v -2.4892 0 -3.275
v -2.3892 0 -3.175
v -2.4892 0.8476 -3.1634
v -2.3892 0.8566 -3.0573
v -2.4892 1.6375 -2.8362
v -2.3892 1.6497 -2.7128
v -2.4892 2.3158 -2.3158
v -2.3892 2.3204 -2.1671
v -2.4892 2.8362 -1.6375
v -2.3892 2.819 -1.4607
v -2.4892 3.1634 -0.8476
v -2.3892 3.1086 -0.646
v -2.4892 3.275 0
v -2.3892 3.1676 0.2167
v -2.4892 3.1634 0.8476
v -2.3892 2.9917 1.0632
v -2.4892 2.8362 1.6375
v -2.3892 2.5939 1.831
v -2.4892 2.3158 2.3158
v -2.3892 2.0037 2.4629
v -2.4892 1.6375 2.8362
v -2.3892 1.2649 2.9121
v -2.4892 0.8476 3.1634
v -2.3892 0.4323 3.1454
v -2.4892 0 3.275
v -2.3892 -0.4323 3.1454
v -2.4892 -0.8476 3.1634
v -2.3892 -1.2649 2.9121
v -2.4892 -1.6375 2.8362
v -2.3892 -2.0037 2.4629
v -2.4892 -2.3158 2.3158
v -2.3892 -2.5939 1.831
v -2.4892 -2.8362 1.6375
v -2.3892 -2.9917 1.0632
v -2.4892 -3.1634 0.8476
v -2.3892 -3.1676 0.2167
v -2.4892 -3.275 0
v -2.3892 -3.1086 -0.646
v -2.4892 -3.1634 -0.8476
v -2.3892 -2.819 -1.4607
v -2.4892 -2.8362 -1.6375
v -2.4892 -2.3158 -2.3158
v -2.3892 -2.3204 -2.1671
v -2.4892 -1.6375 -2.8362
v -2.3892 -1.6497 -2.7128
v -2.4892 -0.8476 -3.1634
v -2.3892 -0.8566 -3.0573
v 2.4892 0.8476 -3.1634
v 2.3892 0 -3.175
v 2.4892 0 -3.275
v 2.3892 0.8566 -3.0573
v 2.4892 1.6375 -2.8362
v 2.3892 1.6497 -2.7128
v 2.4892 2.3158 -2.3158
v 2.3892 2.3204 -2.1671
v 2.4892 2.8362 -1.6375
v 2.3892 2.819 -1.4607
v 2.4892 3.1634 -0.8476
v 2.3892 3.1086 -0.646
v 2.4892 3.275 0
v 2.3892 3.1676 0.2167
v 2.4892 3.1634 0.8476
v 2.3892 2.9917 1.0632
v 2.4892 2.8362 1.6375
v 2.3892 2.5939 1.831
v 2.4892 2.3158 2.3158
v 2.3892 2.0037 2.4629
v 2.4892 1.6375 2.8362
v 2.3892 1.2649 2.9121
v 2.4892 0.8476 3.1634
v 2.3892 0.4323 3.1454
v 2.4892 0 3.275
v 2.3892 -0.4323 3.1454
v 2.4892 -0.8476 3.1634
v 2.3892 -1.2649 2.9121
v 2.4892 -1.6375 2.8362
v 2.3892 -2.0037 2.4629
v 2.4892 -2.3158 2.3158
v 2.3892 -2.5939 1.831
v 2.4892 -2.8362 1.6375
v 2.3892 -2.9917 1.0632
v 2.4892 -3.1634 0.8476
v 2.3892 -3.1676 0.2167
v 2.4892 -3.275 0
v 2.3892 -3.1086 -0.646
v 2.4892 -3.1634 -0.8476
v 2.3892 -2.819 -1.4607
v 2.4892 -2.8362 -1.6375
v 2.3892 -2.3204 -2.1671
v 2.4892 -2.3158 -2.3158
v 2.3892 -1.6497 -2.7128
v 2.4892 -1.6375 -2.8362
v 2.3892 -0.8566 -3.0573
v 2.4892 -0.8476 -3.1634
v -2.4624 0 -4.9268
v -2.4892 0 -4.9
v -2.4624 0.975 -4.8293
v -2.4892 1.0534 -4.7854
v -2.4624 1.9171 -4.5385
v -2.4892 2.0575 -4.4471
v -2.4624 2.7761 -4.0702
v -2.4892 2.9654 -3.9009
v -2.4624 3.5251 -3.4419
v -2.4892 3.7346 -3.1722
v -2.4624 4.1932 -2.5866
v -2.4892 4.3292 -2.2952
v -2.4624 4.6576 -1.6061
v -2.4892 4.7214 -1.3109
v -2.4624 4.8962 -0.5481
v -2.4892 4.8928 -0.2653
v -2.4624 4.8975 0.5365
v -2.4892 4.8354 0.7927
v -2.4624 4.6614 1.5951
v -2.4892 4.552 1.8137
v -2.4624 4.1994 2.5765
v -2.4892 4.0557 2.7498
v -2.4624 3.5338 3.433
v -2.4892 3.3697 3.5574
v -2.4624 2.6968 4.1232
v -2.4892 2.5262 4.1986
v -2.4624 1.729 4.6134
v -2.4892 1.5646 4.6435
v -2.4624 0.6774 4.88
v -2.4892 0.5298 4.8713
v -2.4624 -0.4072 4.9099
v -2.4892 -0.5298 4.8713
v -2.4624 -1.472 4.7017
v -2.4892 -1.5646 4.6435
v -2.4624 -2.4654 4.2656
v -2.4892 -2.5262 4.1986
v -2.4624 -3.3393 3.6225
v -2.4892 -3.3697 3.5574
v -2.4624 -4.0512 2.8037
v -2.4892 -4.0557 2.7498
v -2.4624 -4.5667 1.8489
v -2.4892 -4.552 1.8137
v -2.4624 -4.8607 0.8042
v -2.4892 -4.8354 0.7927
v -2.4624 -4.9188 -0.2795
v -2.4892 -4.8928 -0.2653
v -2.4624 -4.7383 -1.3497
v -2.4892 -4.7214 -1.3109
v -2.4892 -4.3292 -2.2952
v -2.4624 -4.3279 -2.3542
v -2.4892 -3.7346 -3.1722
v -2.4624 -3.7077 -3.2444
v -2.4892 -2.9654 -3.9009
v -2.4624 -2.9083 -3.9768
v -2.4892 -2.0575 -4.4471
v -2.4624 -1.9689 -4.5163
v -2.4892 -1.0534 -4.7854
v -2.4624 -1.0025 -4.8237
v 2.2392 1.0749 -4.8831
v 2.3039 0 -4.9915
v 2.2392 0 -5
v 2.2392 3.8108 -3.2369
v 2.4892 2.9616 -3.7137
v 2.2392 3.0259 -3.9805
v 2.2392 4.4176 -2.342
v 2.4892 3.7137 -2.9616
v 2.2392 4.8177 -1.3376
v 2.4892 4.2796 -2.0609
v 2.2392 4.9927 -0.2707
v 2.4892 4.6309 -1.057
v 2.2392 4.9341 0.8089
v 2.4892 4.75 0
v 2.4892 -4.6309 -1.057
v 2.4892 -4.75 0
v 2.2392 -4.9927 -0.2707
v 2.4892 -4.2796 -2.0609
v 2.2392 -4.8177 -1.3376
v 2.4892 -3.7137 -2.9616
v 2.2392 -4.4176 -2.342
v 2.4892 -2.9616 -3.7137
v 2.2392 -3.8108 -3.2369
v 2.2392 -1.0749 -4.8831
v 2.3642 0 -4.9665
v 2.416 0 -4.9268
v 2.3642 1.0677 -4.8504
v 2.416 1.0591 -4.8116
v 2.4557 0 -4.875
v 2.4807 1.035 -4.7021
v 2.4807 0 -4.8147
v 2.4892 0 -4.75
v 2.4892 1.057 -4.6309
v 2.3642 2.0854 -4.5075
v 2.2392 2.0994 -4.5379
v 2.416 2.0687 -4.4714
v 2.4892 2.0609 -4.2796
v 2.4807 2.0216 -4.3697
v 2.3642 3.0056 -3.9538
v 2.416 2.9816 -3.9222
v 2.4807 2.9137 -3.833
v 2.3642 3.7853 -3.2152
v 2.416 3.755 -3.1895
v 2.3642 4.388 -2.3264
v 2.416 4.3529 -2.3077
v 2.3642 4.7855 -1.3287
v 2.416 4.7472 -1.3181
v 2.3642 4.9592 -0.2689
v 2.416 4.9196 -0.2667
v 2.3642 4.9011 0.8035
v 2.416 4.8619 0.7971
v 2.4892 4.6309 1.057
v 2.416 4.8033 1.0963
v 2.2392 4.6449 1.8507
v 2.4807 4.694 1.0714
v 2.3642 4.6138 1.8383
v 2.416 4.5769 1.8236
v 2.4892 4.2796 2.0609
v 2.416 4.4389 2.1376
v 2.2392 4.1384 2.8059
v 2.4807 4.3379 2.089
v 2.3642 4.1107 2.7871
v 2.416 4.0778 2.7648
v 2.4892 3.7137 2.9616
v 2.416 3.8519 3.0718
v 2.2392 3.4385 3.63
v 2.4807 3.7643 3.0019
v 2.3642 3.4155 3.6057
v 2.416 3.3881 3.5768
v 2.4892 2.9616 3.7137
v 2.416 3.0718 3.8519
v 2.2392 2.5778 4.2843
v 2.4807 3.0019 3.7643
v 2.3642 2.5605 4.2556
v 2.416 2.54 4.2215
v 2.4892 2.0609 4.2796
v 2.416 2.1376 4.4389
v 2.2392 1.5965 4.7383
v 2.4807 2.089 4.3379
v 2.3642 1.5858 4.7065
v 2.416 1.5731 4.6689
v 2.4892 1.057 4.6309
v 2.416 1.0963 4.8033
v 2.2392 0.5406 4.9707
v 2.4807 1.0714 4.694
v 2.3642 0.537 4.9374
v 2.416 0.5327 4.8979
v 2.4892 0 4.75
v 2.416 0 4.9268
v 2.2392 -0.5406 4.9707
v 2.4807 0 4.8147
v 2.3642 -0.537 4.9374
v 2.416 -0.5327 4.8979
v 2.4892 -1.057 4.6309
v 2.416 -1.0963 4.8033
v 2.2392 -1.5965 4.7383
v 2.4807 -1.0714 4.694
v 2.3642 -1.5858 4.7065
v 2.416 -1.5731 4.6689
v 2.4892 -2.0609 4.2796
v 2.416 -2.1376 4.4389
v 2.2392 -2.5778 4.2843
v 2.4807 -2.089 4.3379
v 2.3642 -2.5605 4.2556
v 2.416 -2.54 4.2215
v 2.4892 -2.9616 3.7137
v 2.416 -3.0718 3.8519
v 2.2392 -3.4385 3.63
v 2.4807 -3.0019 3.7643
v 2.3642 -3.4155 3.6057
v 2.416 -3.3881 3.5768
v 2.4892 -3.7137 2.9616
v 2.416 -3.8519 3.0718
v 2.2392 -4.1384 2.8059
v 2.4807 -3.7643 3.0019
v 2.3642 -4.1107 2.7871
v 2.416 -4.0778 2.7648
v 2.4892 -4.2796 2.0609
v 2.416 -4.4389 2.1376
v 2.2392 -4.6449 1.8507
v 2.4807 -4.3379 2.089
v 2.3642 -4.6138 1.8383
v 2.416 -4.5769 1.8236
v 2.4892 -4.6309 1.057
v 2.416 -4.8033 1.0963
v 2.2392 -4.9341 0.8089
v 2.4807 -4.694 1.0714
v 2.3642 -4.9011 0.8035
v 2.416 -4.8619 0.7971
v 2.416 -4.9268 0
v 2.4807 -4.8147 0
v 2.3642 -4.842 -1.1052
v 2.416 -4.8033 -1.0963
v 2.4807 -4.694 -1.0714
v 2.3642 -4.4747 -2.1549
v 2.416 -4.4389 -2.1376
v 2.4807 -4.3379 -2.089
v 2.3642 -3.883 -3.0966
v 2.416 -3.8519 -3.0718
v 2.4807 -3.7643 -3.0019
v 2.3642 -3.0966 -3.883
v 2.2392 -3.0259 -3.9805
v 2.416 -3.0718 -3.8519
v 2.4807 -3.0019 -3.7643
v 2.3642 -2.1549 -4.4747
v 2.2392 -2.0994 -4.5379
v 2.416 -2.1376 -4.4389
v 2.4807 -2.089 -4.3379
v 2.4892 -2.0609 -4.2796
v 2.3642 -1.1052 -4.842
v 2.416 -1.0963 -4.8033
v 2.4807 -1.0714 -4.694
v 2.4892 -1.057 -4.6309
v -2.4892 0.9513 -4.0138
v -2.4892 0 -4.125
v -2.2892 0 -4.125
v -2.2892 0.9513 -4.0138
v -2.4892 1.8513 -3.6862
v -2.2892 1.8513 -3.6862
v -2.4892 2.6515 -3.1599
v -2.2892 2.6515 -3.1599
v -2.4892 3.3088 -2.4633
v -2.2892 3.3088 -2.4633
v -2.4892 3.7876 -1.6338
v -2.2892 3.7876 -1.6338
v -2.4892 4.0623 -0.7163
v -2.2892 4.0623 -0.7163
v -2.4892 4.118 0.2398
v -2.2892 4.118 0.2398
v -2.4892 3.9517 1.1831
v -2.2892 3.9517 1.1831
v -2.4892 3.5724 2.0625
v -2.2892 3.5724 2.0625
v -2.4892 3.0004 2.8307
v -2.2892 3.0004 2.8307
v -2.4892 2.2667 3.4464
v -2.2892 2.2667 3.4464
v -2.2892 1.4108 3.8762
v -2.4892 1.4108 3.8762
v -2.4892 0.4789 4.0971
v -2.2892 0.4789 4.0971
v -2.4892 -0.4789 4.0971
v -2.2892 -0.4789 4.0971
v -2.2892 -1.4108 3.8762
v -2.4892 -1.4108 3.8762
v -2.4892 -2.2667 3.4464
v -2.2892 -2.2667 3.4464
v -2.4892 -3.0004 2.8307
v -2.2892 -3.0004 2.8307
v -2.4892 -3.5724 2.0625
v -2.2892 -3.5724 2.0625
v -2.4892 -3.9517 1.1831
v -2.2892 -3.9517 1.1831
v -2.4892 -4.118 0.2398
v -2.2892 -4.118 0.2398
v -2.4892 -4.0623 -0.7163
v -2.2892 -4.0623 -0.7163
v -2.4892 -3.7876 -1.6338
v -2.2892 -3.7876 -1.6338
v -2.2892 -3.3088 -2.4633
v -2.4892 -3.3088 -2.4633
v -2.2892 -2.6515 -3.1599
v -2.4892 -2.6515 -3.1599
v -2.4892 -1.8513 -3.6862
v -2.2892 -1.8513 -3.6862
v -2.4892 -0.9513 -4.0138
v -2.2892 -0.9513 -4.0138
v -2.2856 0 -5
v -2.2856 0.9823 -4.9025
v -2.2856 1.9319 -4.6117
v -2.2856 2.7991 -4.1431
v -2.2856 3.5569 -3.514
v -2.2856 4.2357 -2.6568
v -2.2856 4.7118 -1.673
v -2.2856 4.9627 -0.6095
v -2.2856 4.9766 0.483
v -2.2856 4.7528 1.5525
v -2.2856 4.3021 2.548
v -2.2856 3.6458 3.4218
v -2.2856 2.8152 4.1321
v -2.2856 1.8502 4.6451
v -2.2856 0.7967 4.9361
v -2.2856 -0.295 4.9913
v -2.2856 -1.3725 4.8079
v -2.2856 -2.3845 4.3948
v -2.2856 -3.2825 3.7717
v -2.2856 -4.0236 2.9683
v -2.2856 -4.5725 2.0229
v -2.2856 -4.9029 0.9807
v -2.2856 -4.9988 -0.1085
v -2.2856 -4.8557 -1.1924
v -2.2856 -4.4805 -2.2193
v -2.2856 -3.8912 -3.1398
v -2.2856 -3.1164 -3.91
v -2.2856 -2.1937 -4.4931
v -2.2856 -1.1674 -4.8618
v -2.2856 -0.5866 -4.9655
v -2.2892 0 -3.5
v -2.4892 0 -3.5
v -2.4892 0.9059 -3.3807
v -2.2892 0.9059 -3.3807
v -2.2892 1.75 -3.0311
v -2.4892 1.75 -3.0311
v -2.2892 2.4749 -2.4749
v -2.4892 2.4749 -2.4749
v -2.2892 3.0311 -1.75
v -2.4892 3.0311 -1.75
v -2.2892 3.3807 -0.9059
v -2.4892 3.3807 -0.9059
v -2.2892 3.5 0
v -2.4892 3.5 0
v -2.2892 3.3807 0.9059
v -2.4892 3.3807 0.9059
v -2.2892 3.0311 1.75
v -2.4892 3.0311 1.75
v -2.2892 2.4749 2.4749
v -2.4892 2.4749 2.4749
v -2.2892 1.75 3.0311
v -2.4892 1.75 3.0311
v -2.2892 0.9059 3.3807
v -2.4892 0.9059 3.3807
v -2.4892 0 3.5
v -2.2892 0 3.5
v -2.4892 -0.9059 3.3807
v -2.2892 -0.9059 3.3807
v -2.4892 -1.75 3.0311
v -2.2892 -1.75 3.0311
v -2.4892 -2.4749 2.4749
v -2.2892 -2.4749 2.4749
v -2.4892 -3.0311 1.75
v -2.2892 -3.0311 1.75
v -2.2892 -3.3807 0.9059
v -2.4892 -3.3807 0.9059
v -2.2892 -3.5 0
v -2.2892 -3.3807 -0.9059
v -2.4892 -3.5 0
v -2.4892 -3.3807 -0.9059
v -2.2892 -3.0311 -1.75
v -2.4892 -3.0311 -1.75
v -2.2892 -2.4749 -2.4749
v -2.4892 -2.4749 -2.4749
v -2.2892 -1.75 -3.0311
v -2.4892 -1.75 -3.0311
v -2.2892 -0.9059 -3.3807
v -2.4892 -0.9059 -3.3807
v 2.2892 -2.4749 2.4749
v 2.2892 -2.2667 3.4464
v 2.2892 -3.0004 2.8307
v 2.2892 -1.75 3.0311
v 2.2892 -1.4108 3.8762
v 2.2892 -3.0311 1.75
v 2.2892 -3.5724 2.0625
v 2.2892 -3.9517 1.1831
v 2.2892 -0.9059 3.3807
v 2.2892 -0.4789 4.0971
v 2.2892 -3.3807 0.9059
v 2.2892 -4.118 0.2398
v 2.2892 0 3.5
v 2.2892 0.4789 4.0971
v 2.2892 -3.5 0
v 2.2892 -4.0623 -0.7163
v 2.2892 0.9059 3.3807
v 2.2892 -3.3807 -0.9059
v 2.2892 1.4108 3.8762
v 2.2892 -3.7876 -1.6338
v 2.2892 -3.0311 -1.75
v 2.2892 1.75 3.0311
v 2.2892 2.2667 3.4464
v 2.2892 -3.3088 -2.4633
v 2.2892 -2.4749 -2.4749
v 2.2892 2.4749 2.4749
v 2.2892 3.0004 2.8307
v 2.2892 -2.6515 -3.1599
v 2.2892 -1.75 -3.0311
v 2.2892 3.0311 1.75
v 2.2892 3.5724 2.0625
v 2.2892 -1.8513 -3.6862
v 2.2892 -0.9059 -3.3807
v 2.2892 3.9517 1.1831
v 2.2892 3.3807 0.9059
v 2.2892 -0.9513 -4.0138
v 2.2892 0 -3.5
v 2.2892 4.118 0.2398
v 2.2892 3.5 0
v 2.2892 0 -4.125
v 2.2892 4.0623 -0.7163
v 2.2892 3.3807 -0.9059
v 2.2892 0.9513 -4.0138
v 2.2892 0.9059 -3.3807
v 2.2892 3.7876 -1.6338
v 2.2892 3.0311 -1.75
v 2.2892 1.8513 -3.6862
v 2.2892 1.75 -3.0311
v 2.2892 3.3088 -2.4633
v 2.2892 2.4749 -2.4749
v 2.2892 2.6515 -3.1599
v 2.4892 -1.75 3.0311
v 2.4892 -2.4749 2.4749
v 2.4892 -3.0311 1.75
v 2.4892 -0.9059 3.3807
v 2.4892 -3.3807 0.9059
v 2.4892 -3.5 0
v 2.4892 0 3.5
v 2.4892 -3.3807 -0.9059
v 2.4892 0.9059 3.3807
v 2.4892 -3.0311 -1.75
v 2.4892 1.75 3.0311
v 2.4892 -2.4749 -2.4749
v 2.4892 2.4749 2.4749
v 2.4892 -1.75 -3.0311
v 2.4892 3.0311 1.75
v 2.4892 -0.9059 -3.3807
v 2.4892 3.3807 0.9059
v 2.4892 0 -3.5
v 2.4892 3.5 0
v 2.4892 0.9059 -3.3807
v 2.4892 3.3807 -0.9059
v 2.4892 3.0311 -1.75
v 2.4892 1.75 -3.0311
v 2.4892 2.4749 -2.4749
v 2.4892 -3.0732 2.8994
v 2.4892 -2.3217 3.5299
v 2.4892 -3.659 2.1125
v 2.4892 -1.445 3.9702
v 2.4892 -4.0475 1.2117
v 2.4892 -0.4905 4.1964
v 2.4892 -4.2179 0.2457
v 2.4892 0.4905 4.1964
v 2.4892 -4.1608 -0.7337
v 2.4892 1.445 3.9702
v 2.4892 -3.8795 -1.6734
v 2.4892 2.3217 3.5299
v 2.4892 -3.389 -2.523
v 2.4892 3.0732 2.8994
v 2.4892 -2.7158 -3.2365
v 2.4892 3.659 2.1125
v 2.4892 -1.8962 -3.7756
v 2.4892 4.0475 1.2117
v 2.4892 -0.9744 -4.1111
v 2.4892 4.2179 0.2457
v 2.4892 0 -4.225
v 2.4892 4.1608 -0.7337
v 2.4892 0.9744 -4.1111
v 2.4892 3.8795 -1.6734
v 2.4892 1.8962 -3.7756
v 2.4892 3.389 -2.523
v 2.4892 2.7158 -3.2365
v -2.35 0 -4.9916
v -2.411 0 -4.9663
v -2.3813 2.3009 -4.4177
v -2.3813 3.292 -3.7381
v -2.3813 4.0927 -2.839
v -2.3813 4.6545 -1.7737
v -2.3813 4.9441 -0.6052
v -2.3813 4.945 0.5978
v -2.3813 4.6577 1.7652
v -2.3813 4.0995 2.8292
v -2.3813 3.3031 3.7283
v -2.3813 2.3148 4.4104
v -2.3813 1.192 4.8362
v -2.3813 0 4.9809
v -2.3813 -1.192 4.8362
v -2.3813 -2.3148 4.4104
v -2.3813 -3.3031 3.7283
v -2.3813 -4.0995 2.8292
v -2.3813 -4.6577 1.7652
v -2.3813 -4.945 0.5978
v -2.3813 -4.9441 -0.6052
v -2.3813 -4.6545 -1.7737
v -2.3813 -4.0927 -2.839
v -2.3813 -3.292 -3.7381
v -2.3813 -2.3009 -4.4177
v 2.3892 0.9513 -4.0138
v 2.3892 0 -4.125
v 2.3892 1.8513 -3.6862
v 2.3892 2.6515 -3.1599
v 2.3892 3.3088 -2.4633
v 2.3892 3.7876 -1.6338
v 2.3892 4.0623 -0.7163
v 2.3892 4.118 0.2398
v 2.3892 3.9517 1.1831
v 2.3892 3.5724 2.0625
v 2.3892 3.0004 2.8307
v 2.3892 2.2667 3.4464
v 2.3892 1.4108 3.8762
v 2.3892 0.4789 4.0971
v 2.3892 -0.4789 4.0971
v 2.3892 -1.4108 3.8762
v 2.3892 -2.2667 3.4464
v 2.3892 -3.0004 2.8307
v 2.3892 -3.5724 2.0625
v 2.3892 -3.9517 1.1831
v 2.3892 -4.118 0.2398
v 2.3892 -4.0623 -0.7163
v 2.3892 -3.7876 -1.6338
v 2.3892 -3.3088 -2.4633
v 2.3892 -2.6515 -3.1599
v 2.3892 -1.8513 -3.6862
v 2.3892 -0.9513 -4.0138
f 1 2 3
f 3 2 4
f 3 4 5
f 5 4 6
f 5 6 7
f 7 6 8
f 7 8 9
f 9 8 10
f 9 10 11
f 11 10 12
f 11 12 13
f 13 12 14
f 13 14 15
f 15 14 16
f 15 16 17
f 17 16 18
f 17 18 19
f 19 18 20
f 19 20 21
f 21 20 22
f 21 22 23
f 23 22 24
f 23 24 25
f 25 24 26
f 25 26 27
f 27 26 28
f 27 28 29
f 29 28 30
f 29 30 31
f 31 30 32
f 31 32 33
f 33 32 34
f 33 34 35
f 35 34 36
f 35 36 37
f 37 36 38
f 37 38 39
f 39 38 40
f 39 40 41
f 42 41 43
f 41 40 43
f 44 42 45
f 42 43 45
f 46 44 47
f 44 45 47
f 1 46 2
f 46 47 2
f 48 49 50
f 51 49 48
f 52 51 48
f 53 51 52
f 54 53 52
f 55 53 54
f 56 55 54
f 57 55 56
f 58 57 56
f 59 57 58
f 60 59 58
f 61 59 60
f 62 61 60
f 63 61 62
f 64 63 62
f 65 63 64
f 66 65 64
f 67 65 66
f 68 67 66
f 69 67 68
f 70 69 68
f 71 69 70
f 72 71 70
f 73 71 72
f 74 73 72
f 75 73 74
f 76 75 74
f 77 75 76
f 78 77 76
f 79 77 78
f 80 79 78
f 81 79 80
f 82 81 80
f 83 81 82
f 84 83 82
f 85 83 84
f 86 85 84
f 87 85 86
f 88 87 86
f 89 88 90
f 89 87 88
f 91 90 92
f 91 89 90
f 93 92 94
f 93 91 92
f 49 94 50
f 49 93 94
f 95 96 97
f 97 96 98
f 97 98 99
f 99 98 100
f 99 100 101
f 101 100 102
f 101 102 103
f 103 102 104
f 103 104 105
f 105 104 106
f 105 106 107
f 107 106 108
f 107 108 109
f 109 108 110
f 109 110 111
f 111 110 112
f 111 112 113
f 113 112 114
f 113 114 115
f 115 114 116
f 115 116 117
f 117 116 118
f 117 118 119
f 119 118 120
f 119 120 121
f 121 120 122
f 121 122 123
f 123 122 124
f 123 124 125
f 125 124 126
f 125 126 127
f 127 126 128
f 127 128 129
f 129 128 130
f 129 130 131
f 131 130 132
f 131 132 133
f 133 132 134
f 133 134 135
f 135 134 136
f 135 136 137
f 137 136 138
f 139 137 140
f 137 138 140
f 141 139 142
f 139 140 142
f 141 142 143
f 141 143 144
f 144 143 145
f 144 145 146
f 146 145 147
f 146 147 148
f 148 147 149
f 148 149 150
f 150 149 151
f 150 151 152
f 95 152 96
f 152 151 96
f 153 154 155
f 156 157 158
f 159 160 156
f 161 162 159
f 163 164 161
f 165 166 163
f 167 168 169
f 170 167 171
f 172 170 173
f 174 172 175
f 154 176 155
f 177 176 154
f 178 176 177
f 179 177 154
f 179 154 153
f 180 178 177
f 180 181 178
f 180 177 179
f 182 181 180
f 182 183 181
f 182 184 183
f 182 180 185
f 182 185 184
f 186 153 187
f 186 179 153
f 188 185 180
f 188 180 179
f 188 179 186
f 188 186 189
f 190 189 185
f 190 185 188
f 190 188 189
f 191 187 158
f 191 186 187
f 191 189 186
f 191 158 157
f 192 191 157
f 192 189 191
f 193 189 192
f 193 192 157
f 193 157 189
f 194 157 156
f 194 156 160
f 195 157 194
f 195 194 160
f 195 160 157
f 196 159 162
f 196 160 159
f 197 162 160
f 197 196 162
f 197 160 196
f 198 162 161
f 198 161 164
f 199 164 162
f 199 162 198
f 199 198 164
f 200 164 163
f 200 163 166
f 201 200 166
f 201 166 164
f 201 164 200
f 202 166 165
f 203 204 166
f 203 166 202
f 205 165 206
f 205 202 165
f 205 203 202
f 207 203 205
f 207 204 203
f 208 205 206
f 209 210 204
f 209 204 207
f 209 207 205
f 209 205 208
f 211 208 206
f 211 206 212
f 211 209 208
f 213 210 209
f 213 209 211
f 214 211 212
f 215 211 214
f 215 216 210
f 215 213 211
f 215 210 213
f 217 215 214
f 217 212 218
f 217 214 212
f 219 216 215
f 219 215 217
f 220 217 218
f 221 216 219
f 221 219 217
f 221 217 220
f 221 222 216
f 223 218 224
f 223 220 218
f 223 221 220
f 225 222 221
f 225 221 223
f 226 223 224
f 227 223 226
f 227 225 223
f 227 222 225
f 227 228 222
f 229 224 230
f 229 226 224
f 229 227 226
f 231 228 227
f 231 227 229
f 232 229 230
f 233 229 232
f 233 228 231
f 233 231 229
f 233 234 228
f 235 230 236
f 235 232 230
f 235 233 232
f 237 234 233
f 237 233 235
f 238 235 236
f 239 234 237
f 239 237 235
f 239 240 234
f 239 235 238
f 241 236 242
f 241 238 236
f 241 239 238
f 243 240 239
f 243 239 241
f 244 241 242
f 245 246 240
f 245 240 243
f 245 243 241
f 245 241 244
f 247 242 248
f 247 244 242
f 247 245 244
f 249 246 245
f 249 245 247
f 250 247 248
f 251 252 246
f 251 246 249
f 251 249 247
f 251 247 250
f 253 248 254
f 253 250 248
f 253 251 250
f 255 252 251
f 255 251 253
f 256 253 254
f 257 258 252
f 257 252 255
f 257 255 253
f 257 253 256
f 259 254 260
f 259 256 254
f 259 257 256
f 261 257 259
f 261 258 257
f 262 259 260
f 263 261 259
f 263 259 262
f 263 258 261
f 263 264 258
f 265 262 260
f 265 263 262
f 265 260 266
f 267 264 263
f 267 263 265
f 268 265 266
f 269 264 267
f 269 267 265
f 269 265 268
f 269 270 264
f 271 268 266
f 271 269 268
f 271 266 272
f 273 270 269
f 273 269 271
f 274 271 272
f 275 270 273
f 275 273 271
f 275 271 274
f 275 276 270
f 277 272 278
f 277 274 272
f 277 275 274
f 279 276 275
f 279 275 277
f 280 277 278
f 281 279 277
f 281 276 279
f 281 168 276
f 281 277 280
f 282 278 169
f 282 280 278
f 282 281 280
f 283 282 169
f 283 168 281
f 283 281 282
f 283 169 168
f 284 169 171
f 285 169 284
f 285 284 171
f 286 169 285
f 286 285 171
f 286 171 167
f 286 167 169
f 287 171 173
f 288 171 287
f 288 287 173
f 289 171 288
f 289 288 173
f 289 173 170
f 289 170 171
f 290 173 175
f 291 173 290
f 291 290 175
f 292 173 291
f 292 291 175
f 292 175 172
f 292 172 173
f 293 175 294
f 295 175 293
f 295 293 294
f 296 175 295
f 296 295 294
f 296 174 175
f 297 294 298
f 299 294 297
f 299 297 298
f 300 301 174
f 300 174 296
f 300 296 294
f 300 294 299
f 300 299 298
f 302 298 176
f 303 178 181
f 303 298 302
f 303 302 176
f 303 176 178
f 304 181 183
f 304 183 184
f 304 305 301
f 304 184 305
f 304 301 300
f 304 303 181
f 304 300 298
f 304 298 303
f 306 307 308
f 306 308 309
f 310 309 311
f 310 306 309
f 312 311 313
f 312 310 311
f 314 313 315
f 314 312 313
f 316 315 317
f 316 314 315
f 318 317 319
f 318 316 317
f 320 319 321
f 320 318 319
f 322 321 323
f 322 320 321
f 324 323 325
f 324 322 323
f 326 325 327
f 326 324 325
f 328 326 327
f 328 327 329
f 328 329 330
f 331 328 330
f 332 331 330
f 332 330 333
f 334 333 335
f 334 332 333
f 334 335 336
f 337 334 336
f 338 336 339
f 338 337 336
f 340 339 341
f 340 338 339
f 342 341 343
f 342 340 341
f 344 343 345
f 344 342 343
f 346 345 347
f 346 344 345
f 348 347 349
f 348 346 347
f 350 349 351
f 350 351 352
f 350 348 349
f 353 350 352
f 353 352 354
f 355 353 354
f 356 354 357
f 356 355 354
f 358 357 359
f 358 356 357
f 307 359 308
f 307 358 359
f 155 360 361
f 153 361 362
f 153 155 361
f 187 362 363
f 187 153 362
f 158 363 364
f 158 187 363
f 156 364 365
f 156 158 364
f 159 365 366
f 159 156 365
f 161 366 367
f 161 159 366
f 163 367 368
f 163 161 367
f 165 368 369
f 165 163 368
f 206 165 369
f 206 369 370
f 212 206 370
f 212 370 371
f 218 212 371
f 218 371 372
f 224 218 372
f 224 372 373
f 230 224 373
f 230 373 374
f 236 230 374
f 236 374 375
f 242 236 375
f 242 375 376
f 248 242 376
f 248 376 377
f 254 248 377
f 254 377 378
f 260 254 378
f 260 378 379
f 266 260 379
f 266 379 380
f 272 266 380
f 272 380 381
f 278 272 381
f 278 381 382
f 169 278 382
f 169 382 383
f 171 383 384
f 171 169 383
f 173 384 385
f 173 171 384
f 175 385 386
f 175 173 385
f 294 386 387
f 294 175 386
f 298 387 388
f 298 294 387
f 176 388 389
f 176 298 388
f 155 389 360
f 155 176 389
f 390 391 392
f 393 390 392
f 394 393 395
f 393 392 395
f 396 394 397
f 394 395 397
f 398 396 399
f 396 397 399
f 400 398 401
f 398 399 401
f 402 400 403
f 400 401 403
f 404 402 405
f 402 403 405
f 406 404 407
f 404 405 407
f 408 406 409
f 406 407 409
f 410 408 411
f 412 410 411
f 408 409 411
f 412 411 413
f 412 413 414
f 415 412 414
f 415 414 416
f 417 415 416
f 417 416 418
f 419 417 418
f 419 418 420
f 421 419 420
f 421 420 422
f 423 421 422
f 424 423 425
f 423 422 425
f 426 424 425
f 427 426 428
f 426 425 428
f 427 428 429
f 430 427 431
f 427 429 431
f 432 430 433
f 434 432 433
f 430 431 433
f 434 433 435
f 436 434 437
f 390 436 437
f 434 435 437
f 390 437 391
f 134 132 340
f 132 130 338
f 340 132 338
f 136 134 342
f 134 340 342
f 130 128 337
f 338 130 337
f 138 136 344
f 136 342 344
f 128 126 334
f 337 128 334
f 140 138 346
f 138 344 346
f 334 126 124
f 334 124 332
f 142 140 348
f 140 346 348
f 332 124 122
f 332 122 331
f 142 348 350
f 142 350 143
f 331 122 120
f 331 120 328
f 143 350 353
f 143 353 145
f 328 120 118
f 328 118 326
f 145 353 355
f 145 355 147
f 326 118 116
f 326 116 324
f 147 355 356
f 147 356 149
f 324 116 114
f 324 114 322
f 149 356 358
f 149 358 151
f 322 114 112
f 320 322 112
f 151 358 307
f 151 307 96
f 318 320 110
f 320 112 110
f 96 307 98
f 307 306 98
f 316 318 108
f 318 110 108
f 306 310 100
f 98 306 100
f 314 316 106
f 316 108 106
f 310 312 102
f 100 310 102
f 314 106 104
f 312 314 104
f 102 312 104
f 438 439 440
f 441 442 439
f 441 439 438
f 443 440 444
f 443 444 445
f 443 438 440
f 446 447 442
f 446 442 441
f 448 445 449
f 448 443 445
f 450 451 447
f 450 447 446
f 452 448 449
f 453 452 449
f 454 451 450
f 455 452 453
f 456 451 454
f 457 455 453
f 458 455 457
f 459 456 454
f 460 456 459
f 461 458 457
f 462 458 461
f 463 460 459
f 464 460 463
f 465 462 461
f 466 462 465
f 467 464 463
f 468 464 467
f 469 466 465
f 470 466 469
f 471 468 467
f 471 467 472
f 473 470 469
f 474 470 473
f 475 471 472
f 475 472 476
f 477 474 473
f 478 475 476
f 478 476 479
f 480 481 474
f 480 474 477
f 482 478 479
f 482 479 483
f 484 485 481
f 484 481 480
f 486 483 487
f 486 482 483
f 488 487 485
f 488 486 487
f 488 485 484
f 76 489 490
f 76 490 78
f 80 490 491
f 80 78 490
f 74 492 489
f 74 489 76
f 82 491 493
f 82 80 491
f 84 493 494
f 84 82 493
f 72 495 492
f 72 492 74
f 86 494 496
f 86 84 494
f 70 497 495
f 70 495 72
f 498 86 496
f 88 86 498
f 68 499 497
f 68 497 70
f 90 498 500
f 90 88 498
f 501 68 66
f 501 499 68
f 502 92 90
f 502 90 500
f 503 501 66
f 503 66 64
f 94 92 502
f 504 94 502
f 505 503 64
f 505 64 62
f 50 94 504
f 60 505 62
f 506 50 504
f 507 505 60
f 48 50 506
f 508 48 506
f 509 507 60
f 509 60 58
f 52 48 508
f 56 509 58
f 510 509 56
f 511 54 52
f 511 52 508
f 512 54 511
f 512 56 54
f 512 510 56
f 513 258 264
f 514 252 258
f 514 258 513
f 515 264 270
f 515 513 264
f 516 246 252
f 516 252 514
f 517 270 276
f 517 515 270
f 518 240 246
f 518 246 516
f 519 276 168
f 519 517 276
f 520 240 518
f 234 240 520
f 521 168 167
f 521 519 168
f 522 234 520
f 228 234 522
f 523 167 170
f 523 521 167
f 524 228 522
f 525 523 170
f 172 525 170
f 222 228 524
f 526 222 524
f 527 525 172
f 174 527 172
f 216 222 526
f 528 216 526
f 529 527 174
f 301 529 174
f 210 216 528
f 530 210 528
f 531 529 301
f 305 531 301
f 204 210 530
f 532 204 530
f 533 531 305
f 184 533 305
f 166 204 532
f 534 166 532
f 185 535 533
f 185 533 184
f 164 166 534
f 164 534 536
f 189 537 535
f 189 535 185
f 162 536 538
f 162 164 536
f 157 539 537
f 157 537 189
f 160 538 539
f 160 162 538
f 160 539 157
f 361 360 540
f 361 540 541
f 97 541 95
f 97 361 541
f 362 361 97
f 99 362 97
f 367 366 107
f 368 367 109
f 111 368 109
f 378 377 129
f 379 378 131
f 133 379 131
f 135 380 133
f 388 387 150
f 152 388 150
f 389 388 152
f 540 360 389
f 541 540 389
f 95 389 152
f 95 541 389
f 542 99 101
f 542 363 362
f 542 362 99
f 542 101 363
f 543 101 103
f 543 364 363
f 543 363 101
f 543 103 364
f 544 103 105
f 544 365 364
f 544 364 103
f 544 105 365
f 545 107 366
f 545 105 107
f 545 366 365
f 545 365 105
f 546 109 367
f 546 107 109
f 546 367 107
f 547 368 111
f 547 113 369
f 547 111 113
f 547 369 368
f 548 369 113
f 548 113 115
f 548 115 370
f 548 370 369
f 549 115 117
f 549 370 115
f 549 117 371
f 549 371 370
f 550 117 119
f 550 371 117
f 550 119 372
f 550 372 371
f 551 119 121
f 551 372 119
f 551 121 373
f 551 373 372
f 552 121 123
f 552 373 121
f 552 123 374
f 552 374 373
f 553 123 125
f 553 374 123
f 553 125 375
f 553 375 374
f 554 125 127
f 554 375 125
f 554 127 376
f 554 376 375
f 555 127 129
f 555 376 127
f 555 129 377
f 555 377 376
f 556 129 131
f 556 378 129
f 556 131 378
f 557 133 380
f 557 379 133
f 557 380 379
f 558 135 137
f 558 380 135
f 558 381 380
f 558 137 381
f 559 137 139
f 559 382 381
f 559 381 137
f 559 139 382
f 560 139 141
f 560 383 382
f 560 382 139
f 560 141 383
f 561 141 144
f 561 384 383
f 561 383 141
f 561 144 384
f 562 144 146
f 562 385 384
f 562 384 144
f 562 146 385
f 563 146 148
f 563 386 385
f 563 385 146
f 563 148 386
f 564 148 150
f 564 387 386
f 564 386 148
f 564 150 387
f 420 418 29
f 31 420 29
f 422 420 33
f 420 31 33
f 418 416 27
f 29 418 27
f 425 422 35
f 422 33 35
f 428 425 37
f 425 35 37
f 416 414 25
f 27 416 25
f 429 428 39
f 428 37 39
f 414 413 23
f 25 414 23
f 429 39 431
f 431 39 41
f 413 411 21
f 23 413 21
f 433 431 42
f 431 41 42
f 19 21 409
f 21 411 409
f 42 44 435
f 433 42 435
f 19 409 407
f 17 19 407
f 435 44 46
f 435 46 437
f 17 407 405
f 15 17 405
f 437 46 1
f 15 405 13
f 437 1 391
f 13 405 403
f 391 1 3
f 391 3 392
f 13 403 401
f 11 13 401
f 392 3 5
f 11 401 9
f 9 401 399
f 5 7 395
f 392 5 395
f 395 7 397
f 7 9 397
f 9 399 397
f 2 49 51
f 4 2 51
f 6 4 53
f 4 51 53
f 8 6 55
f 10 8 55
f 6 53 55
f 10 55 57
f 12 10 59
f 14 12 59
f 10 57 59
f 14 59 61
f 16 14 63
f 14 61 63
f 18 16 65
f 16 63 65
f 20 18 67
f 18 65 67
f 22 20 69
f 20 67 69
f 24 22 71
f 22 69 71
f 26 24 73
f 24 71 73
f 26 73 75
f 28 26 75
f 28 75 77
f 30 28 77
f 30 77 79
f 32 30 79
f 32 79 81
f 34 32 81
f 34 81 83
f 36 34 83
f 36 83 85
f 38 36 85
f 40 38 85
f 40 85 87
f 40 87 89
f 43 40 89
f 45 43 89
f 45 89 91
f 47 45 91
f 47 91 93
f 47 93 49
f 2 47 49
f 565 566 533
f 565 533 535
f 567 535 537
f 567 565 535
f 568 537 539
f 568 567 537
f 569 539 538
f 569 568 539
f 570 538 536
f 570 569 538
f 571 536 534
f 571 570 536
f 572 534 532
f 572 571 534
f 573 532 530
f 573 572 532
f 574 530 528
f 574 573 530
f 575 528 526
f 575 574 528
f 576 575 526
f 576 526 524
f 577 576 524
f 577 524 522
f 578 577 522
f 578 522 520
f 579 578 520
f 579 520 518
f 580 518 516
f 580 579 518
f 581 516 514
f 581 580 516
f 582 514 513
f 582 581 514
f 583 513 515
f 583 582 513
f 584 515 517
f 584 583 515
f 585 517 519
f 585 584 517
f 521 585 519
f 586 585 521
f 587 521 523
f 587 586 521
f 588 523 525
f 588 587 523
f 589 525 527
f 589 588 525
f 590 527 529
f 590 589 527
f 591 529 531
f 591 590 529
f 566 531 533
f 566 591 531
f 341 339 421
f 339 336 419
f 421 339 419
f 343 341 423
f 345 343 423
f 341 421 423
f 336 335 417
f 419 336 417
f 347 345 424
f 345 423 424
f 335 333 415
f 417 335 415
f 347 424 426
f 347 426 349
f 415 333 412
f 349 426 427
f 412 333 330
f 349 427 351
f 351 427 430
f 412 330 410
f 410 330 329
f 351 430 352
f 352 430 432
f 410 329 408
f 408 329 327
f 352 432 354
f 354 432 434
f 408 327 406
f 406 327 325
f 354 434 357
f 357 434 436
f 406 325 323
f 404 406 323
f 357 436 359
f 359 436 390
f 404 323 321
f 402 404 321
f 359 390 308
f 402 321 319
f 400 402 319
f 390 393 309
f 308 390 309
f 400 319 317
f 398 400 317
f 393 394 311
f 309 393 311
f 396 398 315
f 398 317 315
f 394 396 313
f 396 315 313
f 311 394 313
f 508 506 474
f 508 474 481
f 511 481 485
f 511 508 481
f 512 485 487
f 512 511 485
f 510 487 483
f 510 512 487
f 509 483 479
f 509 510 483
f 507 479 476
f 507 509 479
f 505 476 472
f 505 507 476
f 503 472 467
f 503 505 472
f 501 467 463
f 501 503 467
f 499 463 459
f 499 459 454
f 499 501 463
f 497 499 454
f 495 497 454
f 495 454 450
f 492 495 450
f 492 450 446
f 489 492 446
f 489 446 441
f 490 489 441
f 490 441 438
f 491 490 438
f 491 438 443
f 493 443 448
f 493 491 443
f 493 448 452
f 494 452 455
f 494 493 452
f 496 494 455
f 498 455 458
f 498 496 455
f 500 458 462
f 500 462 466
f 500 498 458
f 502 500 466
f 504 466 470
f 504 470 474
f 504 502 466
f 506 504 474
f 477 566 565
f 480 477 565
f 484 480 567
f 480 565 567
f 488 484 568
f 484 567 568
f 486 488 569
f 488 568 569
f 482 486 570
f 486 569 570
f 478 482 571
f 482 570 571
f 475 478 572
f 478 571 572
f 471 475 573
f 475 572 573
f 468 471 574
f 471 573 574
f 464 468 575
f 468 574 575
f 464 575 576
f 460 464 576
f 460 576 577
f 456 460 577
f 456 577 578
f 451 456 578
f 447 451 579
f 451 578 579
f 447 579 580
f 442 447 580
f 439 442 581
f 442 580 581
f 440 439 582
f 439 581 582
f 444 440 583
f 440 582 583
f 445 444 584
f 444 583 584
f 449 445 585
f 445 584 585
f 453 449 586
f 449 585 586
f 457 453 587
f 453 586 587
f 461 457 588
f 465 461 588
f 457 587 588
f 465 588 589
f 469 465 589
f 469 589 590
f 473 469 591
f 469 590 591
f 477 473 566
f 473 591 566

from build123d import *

# Parameters (mm, degrees)
SKETCH2_R           = 5
BOSS_EXTRUDE1_DEPTH = 2.4892
SKETCH3_R           = 3.175
CUT_EXTRUDE1_DEPTH  = 5.9784
SKETCH4_R           = 4.125
SKETCH4_R_2         = 3.5
CUT_EXTRUDE2_DEPTH  = 0.2
CHAMFER1_SIZE       = 0.1
FILLET1_R           = 0.25


with BuildPart() as part:
    # Sketch2 → Boss-Extrude1 (new body, symmetric)
    with BuildSketch(Plane(origin=(0, 0, 0), x_dir=(0, 0, -1), z_dir=(1, 0, 0))):
        Circle(SKETCH2_R)
    extrude(amount=BOSS_EXTRUDE1_DEPTH, both=True)

    # Sketch3 → Cut-Extrude1 (cut, through all)
    with BuildSketch(Plane(origin=(2.4892, 0, 0), x_dir=(0, 0, -1), z_dir=(1, 0, 0))):
        Circle(SKETCH3_R)
    extrude(amount=-CUT_EXTRUDE1_DEPTH, mode=Mode.SUBTRACT)

    # Sketch4 → Cut-Extrude2 (cut)
    with BuildSketch(Plane(origin=(2.4892, 0, 0), x_dir=(0, 0, -1), z_dir=(1, 0, 0))):
        Circle(SKETCH4_R)
        Circle(SKETCH4_R_2, mode=Mode.SUBTRACT)
    cut_extrude2 = extrude(amount=-CUT_EXTRUDE2_DEPTH, mode=Mode.SUBTRACT)

    # Mirror1: Cut-Extrude2 across plane
    add(cut_extrude2.mirror(Plane(origin=(0, 0, 0), x_dir=(0, 0, 1), z_dir=(1, 0, 0))), mode=Mode.SUBTRACT)

    # Chamfer1
    chamfer1_edges = [part.edges().sort_by_distance(p)[0] for p in [
        (2.4892, 0, 4.125),
        (-2.4892, 0, 5),
        (-2.4892, 0, 3.175),
        (2.4892, 0, 3.175),
    ]]
    chamfer(chamfer1_edges, length=CHAMFER1_SIZE)

    # Fillet1
    fillet1_edges = [part.edges().sort_by_distance(p)[0] for p in [
        (-2.3892, 0, 5),
        (2.4892, 0, 5),
    ]]
    fillet(fillet1_edges, radius=FILLET1_R)


solid = part.part
